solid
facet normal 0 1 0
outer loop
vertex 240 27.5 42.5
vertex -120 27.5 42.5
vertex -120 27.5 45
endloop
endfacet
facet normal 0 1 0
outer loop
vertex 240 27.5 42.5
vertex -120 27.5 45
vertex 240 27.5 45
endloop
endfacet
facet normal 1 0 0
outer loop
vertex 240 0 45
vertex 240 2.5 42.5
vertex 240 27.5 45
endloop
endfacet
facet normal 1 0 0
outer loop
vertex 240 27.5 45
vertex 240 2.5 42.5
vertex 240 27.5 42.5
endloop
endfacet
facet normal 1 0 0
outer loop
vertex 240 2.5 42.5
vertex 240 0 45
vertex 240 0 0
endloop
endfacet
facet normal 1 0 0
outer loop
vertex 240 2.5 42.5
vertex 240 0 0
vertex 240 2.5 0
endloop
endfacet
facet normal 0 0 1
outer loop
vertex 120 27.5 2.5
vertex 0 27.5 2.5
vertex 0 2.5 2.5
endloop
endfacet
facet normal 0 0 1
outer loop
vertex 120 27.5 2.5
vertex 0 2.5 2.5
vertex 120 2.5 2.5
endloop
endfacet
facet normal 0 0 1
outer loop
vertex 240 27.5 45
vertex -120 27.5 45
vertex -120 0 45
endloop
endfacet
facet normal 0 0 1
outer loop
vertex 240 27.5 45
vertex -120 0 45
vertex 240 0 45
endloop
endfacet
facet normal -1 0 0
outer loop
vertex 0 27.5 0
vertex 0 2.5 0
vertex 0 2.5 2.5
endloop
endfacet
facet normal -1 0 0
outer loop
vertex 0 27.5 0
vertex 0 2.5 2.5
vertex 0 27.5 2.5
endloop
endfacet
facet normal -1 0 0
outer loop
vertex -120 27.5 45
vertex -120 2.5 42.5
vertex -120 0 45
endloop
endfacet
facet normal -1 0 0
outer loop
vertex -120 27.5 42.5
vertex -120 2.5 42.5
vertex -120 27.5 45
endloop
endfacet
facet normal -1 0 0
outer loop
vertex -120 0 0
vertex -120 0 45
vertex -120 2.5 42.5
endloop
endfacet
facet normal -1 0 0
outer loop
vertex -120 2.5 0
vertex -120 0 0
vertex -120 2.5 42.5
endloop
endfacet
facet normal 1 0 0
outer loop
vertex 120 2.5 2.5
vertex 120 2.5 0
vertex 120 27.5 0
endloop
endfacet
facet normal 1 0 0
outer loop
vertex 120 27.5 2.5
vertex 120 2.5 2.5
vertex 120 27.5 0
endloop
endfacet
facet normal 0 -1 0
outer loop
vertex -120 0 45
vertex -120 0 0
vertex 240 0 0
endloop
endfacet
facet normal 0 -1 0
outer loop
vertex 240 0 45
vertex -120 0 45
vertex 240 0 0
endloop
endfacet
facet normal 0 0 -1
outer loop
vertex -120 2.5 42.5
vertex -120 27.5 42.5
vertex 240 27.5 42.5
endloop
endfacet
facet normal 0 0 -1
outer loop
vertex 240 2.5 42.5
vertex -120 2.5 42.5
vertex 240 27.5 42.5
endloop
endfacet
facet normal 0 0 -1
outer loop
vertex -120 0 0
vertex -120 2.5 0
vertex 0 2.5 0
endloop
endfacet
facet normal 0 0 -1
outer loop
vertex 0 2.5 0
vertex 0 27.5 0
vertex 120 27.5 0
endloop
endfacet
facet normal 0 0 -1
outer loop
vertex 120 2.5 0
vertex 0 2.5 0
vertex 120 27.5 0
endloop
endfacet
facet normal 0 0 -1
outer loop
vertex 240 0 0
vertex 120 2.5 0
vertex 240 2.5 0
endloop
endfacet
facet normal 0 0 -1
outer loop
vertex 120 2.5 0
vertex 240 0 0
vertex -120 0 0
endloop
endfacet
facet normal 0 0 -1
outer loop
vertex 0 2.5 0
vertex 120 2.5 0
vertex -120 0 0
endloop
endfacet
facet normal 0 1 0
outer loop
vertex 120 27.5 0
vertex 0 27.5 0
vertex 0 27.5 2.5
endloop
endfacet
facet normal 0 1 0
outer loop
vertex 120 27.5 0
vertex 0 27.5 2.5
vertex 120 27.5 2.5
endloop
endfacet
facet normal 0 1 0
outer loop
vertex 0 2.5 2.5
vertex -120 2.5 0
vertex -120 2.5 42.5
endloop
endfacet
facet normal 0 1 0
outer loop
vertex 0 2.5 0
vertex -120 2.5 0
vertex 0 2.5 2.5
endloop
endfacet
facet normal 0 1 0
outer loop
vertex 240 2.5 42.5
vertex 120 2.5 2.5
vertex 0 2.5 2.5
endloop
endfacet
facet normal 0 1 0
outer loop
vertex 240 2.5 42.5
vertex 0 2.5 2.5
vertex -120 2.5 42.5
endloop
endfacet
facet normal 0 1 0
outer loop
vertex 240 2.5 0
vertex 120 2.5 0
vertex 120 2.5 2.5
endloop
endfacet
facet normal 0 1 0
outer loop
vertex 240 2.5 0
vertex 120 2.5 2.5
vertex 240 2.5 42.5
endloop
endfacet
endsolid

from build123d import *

# Parameters (mm, degrees)
BOX003_W     = 139
BOX003_H     = 10
BOX003_DEPTH = 10
BOX001_W     = 360
BOX001_H     = 2.5
BOX001_DEPTH = 42.5
BOX_W        = 120
BOX_H        = 37.5
BOX_DEPTH    = 2.5
BOX002_W     = 360
BOX002_H     = 27.5
BOX002_DEPTH = 2.5


with BuildPart() as cube003:
    # Box003 → Box003 (new body)
    with BuildSketch(Plane(origin=(-10, -10, -3), x_dir=(1, 0, 0), z_dir=(0, 0, 1))):
        with Locations((69.5, 5)):
            Rectangle(BOX003_W, BOX003_H)
    extrude(amount=BOX003_DEPTH)


with BuildPart() as cube001:
    # Box001 → Box001 (new body)
    with BuildSketch(Plane(origin=(-120, 0, 0), x_dir=(1, 0, 0), z_dir=(0, 0, 1))):
        with Locations((180, 1.25)):
            Rectangle(BOX001_W, BOX001_H)
    extrude(amount=BOX001_DEPTH)


with BuildPart() as fusion:
    # Box → Box (new body)
    with BuildSketch(Plane(origin=(0, -10, 0), x_dir=(1, 0, 0), z_dir=(0, 0, 1))):
        with Locations((60, 18.75)):
            Rectangle(BOX_W, BOX_H)
    extrude(amount=BOX_DEPTH)

    # Fusion: union Cube001
    add(cube001.part)


with BuildPart() as cut:
    # Box002 → Box002 (new body)
    with BuildSketch(Plane(origin=(-120, 0, 42.5), x_dir=(1, 0, 0), z_dir=(0, 0, 1))):
        with Locations((180, 13.75)):
            Rectangle(BOX002_W, BOX002_H)
    extrude(amount=BOX002_DEPTH)

    # Fusion001: union Fusion
    add(fusion.part)

    # Cut: cut Cube003
    add(cube003.part, mode=Mode.SUBTRACT)


solid = cut.part
